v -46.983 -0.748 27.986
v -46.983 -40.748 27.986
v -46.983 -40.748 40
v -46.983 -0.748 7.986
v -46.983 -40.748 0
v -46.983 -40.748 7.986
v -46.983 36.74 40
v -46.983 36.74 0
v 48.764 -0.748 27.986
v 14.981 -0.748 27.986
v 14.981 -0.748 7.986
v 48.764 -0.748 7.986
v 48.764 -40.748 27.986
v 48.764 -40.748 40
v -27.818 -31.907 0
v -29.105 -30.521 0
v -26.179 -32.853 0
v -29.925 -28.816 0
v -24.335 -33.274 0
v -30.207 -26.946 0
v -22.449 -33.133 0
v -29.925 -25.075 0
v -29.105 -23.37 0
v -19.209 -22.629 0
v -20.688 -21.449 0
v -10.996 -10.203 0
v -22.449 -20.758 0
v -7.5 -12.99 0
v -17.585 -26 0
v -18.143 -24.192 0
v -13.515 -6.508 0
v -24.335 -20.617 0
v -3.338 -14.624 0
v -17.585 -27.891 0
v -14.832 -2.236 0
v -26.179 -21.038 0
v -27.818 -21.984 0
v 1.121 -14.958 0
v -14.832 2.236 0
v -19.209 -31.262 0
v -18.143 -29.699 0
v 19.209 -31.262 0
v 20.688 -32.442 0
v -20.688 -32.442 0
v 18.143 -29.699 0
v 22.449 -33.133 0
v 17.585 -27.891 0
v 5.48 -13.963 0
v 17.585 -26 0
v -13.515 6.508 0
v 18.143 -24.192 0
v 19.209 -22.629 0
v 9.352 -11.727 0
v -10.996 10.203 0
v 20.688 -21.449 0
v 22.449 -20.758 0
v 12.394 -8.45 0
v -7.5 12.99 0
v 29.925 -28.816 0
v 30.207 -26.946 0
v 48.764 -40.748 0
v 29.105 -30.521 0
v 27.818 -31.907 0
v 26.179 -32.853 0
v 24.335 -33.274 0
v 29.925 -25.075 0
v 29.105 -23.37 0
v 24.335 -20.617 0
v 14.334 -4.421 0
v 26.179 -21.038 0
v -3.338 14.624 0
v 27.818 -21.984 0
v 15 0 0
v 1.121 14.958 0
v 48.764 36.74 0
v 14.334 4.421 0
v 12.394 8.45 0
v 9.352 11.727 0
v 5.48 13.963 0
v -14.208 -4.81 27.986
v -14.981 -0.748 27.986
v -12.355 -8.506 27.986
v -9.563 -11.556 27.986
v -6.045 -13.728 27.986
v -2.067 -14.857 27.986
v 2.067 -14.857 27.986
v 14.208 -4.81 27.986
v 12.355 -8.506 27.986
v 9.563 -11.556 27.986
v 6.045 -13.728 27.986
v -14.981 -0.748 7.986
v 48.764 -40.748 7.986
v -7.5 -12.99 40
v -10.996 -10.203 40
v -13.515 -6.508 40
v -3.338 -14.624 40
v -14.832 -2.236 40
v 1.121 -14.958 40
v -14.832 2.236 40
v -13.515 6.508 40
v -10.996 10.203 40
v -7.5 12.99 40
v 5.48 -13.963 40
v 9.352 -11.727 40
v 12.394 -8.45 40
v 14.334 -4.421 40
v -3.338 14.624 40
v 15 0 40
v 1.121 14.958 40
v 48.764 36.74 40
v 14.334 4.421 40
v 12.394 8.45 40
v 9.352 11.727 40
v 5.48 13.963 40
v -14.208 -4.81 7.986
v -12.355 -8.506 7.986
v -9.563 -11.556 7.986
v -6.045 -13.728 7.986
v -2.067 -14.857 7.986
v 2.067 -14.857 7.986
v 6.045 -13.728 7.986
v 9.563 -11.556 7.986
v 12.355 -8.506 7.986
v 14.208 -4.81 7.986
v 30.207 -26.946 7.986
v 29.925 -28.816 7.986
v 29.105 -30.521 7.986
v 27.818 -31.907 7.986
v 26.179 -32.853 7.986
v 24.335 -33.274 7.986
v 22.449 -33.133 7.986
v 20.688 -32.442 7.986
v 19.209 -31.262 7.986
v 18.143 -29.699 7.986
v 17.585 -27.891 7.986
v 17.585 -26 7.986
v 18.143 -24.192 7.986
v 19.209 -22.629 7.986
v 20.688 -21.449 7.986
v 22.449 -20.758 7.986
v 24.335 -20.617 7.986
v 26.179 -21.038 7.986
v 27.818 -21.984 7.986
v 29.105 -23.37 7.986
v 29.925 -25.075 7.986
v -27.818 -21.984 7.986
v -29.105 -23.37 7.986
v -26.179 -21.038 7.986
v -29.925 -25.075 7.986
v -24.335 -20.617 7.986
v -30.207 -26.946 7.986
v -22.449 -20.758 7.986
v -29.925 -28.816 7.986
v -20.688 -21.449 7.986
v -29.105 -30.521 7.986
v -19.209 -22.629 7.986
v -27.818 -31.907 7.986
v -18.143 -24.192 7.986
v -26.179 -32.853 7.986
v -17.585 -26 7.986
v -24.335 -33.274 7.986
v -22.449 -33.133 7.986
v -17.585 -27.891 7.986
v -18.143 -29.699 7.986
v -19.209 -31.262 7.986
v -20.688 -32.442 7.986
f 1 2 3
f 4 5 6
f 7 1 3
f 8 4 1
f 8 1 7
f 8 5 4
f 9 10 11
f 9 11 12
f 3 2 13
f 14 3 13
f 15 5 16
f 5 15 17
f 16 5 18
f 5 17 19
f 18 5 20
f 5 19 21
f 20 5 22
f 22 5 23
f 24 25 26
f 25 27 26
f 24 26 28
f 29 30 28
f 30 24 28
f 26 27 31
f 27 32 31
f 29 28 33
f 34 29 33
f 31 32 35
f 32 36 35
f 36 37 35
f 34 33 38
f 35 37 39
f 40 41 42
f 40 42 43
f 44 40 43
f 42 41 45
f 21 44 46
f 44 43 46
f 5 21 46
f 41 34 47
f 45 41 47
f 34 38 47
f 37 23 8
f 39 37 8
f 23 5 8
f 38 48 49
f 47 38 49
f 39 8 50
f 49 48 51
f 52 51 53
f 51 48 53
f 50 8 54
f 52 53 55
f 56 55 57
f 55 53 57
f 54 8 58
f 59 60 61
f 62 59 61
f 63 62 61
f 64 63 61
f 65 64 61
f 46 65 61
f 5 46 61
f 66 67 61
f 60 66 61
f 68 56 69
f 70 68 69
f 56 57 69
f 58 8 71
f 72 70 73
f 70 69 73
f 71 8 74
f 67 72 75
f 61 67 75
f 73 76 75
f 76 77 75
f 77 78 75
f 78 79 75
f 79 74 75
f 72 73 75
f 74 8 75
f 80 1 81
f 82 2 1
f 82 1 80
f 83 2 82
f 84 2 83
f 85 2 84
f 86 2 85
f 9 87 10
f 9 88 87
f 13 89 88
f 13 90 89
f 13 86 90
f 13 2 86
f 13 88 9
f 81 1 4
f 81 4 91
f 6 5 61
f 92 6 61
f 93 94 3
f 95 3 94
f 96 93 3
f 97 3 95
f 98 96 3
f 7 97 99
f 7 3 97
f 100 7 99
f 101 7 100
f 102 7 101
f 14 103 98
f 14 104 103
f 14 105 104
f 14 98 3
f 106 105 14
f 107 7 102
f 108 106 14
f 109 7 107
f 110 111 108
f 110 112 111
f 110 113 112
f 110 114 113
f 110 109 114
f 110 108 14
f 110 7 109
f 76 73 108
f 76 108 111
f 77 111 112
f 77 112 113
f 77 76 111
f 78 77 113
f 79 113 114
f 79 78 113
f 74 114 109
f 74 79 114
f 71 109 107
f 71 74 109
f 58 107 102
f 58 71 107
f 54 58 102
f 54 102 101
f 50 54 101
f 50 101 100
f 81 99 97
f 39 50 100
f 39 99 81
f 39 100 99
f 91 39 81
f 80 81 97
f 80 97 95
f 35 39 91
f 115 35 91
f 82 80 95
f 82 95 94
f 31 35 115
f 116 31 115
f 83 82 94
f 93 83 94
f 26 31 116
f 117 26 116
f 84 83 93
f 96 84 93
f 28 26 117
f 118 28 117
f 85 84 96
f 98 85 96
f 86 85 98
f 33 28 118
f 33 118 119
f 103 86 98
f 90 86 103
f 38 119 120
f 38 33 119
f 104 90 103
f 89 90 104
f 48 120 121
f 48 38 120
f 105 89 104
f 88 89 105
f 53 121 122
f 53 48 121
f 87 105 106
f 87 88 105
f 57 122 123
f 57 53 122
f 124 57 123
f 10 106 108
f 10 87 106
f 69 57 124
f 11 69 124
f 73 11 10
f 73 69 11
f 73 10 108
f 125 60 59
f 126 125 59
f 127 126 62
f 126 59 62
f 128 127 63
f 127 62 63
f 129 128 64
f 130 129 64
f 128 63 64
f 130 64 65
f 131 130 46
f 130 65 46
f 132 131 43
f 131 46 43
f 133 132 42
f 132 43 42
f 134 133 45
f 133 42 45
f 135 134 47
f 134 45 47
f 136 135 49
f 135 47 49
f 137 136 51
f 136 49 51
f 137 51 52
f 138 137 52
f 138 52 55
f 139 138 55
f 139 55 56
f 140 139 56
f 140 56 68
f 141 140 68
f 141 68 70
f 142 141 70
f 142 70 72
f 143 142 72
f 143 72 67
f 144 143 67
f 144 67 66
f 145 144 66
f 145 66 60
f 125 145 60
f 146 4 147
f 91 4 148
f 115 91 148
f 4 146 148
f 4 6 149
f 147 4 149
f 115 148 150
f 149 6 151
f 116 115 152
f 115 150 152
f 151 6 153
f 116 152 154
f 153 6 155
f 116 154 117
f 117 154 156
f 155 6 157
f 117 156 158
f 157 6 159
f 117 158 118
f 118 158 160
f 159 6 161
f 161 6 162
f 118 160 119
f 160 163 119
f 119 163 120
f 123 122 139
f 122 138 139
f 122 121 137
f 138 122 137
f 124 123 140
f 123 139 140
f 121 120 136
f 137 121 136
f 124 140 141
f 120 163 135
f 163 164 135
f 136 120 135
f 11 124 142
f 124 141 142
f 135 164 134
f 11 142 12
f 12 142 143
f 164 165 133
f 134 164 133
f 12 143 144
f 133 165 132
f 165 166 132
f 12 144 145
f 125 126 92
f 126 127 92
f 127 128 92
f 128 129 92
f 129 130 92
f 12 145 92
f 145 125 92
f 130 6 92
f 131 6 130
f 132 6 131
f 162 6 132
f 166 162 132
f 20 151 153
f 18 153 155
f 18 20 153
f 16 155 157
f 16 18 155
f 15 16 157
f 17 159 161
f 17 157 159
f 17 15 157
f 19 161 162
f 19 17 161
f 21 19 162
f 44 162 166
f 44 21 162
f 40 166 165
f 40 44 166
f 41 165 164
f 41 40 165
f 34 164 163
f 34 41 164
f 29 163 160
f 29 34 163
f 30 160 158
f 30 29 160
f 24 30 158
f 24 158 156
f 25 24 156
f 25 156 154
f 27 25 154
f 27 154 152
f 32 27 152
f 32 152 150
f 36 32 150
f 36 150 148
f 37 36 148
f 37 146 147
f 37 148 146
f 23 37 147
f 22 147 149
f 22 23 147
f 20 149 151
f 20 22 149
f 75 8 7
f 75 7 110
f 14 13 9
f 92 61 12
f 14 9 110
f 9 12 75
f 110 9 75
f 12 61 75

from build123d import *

# Parameters (mm, degrees)
F0_W     = 95.7474842701
F0_H     = 77.4886654093
F0_R     = 15
F1_DEPTH = 40
F2_W     = 95.7474842701
F2_H     = 20
F3_DEPTH = 40
F4_R     = 6.3464300443
F5_DEPTH = 25


# Not quite as in the source:
# - a pattern or mirror of a feature is missing from the dataset's text; its kind, count and spacing are read off the source's solid


with BuildPart() as f1:
    # F0 (on Top) → F1 (new body)
    with BuildSketch(Plane.XY):
        with Locations((0.8906734218, -2.0040220562)):
            Rectangle(F0_W, F0_H)
        Circle(F0_R, mode=Mode.SUBTRACT)
    extrude(amount=F1_DEPTH)

    # F2 (on face) → F3 (cut)
    with BuildSketch(Plane.XZ.offset(40.7483547609)):
        with Locations((0.8906734218, 17.9856412485)):
            Rectangle(F2_W, F2_H)
    extrude(amount=-F3_DEPTH, mode=Mode.SUBTRACT)

    # F4 (on face) → F5 (cut)
    with BuildSketch(Plane(origin=(0, 0, 0), x_dir=(1, 0, 0), z_dir=(0, 0, -1))):
        with Locations((23.8608885556, 26.9455648959)):
            Circle(F4_R)
    f5 = extrude(amount=-F5_DEPTH, mode=Mode.SUBTRACT)

    # F5_copies: F5 across plane
    add(f5.mirror(Plane(origin=(0, 0, 0), x_dir=(0, 0, -1), z_dir=(-1, 0, 0))), mode=Mode.SUBTRACT)


solid = f1.part
